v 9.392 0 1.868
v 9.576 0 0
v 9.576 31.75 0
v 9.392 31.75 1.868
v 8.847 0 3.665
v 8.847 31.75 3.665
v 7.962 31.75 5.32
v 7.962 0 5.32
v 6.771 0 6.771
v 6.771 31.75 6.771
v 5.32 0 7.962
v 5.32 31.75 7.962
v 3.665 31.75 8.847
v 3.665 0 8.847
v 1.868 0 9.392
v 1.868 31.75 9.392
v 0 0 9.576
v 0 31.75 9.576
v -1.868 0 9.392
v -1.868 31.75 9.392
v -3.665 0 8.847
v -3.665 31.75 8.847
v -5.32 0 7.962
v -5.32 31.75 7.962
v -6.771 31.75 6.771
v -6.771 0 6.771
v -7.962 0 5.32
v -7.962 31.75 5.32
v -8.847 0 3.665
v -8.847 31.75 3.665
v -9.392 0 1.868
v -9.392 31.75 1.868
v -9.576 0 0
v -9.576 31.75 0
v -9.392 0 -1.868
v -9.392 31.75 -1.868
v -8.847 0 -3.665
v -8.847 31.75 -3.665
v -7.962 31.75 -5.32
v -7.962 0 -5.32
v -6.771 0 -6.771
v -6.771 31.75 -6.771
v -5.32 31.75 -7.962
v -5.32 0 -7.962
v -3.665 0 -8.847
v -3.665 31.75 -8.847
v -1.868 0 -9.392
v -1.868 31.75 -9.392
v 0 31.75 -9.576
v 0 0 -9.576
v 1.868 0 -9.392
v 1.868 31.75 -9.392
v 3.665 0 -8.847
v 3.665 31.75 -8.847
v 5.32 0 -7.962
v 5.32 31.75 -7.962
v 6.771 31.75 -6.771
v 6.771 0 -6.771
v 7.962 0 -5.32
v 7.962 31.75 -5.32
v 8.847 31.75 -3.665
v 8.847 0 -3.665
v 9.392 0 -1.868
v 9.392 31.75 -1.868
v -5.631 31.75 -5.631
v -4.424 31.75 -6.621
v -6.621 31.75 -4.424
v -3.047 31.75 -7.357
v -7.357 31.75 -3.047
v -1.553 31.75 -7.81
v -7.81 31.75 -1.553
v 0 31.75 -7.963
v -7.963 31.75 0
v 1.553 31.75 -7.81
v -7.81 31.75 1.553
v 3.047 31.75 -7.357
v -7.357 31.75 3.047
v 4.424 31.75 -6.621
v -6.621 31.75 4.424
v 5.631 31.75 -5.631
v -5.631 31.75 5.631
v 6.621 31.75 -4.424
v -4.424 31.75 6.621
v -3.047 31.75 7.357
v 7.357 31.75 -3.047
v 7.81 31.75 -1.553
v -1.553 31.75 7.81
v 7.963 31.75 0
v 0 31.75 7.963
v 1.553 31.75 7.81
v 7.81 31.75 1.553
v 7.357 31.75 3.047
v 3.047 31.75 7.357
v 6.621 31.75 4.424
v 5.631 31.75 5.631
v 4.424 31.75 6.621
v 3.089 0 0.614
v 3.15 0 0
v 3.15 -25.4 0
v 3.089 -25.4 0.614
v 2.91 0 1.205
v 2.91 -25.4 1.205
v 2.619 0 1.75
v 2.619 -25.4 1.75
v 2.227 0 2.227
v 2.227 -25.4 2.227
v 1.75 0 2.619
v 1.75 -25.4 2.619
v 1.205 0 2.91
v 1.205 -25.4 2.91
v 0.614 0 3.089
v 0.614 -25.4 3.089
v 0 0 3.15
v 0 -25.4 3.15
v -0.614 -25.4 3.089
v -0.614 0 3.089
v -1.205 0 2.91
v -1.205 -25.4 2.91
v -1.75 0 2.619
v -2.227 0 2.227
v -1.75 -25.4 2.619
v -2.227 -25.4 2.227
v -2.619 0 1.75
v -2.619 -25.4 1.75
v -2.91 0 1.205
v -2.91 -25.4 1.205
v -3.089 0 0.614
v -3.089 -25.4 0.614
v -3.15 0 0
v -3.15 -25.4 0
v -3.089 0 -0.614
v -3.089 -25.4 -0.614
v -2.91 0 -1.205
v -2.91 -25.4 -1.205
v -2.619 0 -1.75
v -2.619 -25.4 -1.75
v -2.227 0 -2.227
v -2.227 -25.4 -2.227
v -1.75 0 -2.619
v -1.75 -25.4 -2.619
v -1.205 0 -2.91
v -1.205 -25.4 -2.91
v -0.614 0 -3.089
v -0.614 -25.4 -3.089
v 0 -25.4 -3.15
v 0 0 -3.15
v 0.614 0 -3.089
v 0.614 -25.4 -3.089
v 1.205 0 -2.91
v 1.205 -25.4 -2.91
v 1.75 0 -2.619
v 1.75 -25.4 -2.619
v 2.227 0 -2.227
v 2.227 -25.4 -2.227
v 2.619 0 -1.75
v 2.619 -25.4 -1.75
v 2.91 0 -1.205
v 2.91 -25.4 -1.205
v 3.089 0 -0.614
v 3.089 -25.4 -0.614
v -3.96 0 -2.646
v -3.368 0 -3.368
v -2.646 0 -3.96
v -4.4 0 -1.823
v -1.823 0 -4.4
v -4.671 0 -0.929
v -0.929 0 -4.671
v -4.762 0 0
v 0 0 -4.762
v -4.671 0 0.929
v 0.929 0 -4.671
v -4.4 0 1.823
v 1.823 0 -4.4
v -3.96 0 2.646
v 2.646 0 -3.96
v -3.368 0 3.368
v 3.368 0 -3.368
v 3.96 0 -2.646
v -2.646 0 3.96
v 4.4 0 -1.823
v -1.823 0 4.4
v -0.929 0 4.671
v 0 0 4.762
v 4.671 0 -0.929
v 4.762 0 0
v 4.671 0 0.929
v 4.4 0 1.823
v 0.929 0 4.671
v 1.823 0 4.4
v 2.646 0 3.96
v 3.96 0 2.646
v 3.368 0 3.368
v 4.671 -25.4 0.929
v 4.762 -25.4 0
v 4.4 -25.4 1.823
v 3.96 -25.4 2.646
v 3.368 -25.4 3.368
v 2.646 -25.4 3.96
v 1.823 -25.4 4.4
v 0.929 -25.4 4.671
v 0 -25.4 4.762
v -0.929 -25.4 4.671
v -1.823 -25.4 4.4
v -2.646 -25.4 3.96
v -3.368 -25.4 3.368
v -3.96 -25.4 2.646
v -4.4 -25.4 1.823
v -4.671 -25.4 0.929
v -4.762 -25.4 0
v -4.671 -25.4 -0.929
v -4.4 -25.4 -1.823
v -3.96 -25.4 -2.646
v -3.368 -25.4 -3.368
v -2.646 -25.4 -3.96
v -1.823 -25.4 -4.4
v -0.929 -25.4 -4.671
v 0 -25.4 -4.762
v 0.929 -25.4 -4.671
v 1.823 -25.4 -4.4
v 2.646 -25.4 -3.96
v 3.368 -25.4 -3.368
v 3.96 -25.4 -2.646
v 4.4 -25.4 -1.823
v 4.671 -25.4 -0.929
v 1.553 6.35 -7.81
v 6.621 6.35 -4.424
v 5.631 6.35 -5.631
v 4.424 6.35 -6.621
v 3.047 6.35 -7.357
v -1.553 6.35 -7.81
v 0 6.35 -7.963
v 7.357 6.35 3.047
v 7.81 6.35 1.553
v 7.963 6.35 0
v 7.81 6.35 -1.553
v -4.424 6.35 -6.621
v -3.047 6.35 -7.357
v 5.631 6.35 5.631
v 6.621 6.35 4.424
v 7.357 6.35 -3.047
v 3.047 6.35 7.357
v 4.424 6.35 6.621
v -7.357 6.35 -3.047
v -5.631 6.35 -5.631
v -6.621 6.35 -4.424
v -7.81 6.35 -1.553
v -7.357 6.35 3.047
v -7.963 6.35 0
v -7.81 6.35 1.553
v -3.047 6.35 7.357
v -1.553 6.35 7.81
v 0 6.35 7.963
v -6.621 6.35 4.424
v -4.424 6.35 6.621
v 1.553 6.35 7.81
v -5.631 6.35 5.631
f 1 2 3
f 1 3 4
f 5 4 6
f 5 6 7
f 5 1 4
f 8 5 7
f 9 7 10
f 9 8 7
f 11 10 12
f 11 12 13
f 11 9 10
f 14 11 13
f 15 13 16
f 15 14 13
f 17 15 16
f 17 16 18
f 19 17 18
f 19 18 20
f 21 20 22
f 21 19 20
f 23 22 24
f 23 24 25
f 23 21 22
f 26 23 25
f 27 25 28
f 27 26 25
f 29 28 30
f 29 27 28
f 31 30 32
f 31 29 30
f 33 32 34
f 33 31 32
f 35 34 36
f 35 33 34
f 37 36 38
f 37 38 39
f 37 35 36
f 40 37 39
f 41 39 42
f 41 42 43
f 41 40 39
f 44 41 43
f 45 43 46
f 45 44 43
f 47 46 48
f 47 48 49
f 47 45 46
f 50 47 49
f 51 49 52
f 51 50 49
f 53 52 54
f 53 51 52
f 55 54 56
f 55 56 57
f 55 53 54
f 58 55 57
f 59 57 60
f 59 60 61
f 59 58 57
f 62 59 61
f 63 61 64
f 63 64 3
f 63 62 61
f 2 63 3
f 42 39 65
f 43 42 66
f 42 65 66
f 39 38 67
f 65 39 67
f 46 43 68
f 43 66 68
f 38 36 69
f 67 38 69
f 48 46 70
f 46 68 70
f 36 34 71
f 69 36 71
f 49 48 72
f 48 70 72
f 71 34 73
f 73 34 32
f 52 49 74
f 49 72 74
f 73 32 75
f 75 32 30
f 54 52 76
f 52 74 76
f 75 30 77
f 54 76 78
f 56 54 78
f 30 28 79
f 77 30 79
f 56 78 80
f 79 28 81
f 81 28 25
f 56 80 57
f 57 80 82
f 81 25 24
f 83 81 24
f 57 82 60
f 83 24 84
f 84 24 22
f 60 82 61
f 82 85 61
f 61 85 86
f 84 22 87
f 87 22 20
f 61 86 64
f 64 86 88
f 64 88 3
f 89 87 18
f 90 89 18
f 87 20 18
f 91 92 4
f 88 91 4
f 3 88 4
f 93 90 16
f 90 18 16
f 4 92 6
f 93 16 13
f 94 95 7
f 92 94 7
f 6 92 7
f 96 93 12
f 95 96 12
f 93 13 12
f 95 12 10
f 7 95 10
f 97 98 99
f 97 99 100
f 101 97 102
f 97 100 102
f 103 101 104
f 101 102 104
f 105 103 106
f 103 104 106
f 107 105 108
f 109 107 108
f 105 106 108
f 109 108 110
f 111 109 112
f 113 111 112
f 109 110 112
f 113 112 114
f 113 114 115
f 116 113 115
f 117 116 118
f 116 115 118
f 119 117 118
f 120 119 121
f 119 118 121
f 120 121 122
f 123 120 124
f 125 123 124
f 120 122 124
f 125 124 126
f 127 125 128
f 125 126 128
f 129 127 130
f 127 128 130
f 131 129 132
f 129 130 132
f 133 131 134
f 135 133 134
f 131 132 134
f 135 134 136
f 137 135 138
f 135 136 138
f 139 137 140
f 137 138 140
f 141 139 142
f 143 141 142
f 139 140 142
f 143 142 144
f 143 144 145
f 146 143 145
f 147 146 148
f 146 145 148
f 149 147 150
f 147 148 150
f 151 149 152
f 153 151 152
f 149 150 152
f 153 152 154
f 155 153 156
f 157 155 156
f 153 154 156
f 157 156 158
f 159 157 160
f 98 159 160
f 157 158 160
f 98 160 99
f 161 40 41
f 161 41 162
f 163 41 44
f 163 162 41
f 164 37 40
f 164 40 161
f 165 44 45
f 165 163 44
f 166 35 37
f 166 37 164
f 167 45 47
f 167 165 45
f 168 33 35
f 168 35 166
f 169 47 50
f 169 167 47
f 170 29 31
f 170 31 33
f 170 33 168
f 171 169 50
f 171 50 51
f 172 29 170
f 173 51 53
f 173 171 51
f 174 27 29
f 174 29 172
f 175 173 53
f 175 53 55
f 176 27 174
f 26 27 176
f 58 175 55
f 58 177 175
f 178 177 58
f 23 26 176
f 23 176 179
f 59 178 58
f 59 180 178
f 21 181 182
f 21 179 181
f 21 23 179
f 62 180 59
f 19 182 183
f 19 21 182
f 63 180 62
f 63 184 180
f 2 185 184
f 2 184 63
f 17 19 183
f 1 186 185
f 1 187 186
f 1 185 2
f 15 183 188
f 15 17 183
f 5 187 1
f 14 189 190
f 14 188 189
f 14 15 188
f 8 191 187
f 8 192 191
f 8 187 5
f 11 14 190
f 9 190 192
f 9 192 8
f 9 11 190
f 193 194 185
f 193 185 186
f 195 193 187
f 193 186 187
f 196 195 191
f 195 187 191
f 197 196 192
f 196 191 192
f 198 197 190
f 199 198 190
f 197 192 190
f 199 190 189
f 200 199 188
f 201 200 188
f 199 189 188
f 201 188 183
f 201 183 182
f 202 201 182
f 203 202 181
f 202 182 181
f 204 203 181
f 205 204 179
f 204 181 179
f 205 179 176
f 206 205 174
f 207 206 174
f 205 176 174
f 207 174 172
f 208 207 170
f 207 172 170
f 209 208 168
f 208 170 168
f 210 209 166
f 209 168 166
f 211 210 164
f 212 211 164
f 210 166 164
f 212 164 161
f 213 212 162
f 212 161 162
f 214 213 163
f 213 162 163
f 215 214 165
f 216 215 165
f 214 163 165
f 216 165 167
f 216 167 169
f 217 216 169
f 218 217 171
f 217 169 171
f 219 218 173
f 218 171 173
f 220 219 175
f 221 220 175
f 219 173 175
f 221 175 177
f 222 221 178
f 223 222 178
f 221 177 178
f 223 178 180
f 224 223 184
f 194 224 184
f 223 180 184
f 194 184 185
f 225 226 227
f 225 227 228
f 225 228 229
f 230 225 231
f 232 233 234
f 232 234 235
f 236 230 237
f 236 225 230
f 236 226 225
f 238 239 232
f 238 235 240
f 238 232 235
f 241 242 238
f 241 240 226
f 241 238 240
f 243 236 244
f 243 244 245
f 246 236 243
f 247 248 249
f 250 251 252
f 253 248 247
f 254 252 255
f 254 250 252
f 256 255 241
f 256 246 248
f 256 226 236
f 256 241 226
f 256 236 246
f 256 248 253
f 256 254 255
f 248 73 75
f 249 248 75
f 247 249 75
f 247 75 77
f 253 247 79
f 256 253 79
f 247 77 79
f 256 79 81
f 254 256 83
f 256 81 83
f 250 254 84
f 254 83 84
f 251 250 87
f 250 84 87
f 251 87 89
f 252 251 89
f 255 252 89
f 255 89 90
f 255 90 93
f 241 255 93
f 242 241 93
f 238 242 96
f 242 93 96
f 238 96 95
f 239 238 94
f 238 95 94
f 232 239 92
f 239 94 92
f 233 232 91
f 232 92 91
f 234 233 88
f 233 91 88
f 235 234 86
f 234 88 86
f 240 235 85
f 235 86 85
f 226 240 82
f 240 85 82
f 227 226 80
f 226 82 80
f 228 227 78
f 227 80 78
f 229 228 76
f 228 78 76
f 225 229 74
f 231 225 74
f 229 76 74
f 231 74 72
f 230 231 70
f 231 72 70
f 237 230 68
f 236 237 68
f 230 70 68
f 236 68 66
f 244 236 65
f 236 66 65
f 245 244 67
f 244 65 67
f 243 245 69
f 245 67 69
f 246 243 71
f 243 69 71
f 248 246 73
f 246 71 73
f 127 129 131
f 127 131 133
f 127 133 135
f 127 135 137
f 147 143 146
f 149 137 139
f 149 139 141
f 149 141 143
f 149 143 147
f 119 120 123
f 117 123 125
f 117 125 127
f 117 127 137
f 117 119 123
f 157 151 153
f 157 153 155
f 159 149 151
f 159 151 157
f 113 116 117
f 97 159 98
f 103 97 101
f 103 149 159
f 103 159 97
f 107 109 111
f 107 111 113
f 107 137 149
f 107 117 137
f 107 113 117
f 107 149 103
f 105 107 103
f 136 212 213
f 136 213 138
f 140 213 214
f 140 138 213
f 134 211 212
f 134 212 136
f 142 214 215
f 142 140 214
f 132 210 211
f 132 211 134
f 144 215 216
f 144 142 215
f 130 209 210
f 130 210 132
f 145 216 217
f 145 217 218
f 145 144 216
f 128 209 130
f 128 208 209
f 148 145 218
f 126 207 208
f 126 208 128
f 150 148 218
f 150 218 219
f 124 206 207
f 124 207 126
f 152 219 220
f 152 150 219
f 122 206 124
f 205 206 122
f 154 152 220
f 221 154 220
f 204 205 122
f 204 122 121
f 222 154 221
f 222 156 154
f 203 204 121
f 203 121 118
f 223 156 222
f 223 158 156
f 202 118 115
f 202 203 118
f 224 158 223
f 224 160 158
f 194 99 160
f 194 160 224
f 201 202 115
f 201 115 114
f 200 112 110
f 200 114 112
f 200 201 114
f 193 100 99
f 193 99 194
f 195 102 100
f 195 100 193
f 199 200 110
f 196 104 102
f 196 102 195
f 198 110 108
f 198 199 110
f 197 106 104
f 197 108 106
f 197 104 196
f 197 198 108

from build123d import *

# Parameters (mm, degrees)
F0_R     = 9.5758
F1_DEPTH = 31.75
F2_R     = 7.9629
F3_DEPTH = 25.4
F4_R     = 4.7625
F5_DEPTH = 25.4
F6_R     = 3.1496
F7_DEPTH = 25.4


with BuildPart() as f1:
    # F0 (on Front) → F1 (new body)
    with BuildSketch(Plane.XZ):
        Circle(F0_R)
    extrude(amount=-F1_DEPTH)

    # F2 (on face) → F3 (cut)
    with BuildSketch(Plane(origin=(0, 31.75, 0), x_dir=(-1, 0, 0), z_dir=(0, 1, 0))):
        Circle(F2_R)
    extrude(amount=-F3_DEPTH, mode=Mode.SUBTRACT)

    # F4 (on face) → F5 (join)
    with BuildSketch(Plane.XZ):
        Circle(F4_R)
    extrude(amount=F5_DEPTH)

    # F6 (on face) → F7 (cut)
    with BuildSketch(Plane.XZ.offset(25.4)):
        Circle(F6_R)
    extrude(amount=-F7_DEPTH, mode=Mode.SUBTRACT)


solid = f1.part
